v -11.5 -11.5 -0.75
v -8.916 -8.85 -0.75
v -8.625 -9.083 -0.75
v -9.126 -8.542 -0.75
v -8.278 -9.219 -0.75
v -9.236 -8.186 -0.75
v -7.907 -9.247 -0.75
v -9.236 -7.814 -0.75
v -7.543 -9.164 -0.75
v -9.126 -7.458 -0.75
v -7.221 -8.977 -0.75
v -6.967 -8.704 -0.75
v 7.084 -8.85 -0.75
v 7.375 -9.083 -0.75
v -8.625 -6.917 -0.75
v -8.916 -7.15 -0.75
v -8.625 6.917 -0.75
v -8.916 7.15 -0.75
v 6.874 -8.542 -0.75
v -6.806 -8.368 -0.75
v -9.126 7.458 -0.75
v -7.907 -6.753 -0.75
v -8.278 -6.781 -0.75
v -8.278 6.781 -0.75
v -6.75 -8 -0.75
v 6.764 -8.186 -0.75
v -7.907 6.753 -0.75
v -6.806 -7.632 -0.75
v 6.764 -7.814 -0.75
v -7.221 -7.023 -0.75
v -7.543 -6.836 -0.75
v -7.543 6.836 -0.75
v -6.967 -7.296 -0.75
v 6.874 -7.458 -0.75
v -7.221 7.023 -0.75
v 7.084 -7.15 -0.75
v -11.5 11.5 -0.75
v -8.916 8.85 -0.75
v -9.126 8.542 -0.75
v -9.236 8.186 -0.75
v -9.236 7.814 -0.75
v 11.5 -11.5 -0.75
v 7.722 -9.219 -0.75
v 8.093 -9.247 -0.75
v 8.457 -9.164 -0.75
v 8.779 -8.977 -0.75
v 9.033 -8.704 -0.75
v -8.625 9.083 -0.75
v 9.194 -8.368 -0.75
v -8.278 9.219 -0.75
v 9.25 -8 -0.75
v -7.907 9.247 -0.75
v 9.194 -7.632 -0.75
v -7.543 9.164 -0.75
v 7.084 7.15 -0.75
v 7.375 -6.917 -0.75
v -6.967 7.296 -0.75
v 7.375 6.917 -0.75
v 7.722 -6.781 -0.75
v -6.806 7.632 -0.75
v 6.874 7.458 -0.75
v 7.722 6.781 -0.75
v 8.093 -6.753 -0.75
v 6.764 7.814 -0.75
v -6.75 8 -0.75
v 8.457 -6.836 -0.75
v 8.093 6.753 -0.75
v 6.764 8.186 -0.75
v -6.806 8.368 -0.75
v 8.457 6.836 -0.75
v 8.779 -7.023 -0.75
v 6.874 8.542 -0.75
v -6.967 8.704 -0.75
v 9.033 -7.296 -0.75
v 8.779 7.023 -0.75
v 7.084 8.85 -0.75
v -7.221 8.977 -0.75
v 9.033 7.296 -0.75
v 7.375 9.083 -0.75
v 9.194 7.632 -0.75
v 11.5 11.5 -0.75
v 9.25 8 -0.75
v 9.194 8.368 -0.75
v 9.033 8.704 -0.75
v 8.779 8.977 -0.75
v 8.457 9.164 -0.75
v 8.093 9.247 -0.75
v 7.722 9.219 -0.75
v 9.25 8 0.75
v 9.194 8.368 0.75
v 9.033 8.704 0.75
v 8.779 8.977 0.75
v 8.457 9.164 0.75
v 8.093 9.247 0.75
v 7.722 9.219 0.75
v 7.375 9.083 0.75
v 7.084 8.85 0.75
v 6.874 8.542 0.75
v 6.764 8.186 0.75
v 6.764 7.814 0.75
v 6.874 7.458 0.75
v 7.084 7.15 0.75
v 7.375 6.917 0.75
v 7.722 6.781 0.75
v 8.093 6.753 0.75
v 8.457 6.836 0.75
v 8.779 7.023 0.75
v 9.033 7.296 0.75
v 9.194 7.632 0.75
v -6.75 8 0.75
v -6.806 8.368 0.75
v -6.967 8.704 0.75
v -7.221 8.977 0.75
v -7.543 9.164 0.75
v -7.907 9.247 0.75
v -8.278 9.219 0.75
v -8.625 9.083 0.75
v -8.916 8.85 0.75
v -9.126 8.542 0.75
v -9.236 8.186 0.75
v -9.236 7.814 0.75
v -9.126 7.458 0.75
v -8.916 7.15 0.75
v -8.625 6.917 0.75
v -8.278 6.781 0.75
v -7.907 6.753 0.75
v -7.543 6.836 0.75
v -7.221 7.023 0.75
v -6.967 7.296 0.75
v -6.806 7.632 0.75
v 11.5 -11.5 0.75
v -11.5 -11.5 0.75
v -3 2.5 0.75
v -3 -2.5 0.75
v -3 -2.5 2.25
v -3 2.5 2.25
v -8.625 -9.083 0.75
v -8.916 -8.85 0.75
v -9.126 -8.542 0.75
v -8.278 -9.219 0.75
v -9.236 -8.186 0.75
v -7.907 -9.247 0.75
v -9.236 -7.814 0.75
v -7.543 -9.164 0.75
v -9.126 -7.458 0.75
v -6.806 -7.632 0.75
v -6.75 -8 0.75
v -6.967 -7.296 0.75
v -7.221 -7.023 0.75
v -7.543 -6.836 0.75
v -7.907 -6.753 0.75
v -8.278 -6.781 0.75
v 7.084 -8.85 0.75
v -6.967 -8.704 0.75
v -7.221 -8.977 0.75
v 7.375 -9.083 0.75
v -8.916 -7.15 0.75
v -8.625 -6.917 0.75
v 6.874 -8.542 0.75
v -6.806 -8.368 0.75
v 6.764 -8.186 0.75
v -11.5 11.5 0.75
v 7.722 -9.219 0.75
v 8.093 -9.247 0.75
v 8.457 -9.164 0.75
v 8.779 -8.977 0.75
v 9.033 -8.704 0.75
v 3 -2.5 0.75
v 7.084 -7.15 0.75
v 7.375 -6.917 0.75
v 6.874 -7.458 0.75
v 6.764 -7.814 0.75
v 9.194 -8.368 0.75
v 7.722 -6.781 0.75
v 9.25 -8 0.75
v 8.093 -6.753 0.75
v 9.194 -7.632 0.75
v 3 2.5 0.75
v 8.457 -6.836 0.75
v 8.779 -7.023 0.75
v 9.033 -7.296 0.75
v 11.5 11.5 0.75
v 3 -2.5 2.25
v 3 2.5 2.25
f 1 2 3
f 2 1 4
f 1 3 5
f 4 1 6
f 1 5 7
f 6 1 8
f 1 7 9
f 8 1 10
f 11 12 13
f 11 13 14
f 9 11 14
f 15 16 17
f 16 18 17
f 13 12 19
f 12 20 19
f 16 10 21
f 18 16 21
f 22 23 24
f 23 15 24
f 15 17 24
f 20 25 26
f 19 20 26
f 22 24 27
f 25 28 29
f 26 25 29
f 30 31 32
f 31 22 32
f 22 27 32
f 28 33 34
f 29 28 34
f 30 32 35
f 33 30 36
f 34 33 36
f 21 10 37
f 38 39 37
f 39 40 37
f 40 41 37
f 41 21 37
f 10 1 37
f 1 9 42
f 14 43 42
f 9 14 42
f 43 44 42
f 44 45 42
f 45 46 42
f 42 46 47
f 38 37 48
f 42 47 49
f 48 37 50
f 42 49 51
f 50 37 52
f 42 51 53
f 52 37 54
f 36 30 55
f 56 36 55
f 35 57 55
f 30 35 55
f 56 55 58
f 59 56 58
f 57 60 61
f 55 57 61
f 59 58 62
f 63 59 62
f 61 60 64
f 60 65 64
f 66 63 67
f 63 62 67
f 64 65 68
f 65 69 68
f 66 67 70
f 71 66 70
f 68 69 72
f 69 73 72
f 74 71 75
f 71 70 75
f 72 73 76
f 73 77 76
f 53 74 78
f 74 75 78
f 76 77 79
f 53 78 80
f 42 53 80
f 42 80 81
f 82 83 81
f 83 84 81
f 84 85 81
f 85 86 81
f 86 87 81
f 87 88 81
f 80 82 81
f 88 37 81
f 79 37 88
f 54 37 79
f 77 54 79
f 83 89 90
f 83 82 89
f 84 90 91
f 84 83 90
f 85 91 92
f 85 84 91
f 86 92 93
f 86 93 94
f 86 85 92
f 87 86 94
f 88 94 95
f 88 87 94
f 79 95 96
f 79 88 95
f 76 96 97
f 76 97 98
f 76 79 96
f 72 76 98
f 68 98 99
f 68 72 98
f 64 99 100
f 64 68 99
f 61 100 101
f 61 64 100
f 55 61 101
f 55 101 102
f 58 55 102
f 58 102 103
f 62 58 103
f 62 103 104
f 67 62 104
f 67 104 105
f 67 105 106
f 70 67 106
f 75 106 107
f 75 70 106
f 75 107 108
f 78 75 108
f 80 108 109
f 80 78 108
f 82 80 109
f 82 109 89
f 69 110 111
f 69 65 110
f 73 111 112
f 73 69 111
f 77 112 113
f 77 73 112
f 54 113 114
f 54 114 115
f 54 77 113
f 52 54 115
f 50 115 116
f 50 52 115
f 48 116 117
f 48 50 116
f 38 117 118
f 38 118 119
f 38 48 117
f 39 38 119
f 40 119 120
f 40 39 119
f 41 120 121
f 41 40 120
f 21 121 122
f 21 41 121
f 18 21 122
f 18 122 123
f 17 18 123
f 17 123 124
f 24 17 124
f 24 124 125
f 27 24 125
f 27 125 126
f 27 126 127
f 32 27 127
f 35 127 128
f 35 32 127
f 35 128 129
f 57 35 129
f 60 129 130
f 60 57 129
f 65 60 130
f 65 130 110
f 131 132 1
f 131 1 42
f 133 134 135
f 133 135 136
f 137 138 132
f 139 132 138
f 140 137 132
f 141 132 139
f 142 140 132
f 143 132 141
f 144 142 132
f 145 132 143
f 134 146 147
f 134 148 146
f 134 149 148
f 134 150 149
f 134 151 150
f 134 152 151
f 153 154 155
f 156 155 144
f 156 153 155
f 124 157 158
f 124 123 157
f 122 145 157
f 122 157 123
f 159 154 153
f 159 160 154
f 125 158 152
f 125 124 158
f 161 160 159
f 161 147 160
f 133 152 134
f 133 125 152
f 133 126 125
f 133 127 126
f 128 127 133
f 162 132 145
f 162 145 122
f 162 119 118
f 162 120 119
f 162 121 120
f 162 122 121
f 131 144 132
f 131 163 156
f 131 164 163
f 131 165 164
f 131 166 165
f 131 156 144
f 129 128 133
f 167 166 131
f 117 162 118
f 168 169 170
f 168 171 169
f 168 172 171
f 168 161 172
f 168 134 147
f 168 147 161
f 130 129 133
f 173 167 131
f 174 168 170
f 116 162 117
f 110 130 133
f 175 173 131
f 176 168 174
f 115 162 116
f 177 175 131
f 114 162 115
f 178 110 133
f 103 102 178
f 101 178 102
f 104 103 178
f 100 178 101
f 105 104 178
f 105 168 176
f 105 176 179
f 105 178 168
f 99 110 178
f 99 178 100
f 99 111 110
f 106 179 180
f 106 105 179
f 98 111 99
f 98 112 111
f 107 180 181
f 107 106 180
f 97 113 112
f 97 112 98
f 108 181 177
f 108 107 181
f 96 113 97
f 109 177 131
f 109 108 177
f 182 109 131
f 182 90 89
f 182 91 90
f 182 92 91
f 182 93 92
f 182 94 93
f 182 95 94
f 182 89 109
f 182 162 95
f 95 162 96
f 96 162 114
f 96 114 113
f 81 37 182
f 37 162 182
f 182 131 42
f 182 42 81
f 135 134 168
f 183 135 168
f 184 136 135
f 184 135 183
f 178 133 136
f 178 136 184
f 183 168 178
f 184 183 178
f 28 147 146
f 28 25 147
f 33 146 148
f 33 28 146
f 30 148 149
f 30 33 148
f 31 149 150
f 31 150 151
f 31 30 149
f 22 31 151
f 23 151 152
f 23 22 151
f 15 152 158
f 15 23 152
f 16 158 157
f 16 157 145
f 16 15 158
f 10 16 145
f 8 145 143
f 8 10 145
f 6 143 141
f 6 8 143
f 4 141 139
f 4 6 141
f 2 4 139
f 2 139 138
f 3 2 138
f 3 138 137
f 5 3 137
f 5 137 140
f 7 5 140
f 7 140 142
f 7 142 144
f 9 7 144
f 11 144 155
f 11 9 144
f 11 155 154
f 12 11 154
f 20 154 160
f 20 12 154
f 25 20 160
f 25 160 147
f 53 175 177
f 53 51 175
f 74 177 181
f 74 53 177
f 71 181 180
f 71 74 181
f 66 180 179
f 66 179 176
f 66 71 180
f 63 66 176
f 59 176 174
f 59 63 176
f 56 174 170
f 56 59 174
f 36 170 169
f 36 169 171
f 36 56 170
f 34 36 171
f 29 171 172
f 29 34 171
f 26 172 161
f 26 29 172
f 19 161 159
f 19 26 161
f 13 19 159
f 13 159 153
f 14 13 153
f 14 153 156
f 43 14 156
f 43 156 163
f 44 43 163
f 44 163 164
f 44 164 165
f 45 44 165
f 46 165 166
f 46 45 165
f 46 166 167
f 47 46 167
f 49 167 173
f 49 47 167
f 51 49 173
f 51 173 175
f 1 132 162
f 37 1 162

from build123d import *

# Parameters (mm, degrees)
SKETCH_1_W      = 23
SKETCH_1_H      = 23
SKETCH_1_R      = 1.25
EXTRUDE_1_DEPTH = 0.75
SKETCH_2_W      = 6
SKETCH_2_H      = 5
EXTRUDE_2_DEPTH = 1.5


with BuildPart() as part:
    # 草图1 → 凸台-拉伸1 (new, symmetric)
    with BuildSketch(Plane.XY):
        Rectangle(SKETCH_1_W, SKETCH_1_H)
        with Locations((-8, 8)):
            Circle(SKETCH_1_R, mode=Mode.SUBTRACT)
        with Locations((8, 8)):
            Circle(SKETCH_1_R, mode=Mode.SUBTRACT)
        with Locations((8, -8)):
            Circle(SKETCH_1_R, mode=Mode.SUBTRACT)
        with Locations((-8, -8)):
            Circle(SKETCH_1_R, mode=Mode.SUBTRACT)
    extrude(amount=EXTRUDE_1_DEPTH, both=True)

    # 草图2 → 凸台-拉伸2 (add)
    with BuildSketch(Plane.XY.offset(0.75)):
        Rectangle(SKETCH_2_W, SKETCH_2_H)
    extrude(amount=EXTRUDE_2_DEPTH)


solid = part.part
